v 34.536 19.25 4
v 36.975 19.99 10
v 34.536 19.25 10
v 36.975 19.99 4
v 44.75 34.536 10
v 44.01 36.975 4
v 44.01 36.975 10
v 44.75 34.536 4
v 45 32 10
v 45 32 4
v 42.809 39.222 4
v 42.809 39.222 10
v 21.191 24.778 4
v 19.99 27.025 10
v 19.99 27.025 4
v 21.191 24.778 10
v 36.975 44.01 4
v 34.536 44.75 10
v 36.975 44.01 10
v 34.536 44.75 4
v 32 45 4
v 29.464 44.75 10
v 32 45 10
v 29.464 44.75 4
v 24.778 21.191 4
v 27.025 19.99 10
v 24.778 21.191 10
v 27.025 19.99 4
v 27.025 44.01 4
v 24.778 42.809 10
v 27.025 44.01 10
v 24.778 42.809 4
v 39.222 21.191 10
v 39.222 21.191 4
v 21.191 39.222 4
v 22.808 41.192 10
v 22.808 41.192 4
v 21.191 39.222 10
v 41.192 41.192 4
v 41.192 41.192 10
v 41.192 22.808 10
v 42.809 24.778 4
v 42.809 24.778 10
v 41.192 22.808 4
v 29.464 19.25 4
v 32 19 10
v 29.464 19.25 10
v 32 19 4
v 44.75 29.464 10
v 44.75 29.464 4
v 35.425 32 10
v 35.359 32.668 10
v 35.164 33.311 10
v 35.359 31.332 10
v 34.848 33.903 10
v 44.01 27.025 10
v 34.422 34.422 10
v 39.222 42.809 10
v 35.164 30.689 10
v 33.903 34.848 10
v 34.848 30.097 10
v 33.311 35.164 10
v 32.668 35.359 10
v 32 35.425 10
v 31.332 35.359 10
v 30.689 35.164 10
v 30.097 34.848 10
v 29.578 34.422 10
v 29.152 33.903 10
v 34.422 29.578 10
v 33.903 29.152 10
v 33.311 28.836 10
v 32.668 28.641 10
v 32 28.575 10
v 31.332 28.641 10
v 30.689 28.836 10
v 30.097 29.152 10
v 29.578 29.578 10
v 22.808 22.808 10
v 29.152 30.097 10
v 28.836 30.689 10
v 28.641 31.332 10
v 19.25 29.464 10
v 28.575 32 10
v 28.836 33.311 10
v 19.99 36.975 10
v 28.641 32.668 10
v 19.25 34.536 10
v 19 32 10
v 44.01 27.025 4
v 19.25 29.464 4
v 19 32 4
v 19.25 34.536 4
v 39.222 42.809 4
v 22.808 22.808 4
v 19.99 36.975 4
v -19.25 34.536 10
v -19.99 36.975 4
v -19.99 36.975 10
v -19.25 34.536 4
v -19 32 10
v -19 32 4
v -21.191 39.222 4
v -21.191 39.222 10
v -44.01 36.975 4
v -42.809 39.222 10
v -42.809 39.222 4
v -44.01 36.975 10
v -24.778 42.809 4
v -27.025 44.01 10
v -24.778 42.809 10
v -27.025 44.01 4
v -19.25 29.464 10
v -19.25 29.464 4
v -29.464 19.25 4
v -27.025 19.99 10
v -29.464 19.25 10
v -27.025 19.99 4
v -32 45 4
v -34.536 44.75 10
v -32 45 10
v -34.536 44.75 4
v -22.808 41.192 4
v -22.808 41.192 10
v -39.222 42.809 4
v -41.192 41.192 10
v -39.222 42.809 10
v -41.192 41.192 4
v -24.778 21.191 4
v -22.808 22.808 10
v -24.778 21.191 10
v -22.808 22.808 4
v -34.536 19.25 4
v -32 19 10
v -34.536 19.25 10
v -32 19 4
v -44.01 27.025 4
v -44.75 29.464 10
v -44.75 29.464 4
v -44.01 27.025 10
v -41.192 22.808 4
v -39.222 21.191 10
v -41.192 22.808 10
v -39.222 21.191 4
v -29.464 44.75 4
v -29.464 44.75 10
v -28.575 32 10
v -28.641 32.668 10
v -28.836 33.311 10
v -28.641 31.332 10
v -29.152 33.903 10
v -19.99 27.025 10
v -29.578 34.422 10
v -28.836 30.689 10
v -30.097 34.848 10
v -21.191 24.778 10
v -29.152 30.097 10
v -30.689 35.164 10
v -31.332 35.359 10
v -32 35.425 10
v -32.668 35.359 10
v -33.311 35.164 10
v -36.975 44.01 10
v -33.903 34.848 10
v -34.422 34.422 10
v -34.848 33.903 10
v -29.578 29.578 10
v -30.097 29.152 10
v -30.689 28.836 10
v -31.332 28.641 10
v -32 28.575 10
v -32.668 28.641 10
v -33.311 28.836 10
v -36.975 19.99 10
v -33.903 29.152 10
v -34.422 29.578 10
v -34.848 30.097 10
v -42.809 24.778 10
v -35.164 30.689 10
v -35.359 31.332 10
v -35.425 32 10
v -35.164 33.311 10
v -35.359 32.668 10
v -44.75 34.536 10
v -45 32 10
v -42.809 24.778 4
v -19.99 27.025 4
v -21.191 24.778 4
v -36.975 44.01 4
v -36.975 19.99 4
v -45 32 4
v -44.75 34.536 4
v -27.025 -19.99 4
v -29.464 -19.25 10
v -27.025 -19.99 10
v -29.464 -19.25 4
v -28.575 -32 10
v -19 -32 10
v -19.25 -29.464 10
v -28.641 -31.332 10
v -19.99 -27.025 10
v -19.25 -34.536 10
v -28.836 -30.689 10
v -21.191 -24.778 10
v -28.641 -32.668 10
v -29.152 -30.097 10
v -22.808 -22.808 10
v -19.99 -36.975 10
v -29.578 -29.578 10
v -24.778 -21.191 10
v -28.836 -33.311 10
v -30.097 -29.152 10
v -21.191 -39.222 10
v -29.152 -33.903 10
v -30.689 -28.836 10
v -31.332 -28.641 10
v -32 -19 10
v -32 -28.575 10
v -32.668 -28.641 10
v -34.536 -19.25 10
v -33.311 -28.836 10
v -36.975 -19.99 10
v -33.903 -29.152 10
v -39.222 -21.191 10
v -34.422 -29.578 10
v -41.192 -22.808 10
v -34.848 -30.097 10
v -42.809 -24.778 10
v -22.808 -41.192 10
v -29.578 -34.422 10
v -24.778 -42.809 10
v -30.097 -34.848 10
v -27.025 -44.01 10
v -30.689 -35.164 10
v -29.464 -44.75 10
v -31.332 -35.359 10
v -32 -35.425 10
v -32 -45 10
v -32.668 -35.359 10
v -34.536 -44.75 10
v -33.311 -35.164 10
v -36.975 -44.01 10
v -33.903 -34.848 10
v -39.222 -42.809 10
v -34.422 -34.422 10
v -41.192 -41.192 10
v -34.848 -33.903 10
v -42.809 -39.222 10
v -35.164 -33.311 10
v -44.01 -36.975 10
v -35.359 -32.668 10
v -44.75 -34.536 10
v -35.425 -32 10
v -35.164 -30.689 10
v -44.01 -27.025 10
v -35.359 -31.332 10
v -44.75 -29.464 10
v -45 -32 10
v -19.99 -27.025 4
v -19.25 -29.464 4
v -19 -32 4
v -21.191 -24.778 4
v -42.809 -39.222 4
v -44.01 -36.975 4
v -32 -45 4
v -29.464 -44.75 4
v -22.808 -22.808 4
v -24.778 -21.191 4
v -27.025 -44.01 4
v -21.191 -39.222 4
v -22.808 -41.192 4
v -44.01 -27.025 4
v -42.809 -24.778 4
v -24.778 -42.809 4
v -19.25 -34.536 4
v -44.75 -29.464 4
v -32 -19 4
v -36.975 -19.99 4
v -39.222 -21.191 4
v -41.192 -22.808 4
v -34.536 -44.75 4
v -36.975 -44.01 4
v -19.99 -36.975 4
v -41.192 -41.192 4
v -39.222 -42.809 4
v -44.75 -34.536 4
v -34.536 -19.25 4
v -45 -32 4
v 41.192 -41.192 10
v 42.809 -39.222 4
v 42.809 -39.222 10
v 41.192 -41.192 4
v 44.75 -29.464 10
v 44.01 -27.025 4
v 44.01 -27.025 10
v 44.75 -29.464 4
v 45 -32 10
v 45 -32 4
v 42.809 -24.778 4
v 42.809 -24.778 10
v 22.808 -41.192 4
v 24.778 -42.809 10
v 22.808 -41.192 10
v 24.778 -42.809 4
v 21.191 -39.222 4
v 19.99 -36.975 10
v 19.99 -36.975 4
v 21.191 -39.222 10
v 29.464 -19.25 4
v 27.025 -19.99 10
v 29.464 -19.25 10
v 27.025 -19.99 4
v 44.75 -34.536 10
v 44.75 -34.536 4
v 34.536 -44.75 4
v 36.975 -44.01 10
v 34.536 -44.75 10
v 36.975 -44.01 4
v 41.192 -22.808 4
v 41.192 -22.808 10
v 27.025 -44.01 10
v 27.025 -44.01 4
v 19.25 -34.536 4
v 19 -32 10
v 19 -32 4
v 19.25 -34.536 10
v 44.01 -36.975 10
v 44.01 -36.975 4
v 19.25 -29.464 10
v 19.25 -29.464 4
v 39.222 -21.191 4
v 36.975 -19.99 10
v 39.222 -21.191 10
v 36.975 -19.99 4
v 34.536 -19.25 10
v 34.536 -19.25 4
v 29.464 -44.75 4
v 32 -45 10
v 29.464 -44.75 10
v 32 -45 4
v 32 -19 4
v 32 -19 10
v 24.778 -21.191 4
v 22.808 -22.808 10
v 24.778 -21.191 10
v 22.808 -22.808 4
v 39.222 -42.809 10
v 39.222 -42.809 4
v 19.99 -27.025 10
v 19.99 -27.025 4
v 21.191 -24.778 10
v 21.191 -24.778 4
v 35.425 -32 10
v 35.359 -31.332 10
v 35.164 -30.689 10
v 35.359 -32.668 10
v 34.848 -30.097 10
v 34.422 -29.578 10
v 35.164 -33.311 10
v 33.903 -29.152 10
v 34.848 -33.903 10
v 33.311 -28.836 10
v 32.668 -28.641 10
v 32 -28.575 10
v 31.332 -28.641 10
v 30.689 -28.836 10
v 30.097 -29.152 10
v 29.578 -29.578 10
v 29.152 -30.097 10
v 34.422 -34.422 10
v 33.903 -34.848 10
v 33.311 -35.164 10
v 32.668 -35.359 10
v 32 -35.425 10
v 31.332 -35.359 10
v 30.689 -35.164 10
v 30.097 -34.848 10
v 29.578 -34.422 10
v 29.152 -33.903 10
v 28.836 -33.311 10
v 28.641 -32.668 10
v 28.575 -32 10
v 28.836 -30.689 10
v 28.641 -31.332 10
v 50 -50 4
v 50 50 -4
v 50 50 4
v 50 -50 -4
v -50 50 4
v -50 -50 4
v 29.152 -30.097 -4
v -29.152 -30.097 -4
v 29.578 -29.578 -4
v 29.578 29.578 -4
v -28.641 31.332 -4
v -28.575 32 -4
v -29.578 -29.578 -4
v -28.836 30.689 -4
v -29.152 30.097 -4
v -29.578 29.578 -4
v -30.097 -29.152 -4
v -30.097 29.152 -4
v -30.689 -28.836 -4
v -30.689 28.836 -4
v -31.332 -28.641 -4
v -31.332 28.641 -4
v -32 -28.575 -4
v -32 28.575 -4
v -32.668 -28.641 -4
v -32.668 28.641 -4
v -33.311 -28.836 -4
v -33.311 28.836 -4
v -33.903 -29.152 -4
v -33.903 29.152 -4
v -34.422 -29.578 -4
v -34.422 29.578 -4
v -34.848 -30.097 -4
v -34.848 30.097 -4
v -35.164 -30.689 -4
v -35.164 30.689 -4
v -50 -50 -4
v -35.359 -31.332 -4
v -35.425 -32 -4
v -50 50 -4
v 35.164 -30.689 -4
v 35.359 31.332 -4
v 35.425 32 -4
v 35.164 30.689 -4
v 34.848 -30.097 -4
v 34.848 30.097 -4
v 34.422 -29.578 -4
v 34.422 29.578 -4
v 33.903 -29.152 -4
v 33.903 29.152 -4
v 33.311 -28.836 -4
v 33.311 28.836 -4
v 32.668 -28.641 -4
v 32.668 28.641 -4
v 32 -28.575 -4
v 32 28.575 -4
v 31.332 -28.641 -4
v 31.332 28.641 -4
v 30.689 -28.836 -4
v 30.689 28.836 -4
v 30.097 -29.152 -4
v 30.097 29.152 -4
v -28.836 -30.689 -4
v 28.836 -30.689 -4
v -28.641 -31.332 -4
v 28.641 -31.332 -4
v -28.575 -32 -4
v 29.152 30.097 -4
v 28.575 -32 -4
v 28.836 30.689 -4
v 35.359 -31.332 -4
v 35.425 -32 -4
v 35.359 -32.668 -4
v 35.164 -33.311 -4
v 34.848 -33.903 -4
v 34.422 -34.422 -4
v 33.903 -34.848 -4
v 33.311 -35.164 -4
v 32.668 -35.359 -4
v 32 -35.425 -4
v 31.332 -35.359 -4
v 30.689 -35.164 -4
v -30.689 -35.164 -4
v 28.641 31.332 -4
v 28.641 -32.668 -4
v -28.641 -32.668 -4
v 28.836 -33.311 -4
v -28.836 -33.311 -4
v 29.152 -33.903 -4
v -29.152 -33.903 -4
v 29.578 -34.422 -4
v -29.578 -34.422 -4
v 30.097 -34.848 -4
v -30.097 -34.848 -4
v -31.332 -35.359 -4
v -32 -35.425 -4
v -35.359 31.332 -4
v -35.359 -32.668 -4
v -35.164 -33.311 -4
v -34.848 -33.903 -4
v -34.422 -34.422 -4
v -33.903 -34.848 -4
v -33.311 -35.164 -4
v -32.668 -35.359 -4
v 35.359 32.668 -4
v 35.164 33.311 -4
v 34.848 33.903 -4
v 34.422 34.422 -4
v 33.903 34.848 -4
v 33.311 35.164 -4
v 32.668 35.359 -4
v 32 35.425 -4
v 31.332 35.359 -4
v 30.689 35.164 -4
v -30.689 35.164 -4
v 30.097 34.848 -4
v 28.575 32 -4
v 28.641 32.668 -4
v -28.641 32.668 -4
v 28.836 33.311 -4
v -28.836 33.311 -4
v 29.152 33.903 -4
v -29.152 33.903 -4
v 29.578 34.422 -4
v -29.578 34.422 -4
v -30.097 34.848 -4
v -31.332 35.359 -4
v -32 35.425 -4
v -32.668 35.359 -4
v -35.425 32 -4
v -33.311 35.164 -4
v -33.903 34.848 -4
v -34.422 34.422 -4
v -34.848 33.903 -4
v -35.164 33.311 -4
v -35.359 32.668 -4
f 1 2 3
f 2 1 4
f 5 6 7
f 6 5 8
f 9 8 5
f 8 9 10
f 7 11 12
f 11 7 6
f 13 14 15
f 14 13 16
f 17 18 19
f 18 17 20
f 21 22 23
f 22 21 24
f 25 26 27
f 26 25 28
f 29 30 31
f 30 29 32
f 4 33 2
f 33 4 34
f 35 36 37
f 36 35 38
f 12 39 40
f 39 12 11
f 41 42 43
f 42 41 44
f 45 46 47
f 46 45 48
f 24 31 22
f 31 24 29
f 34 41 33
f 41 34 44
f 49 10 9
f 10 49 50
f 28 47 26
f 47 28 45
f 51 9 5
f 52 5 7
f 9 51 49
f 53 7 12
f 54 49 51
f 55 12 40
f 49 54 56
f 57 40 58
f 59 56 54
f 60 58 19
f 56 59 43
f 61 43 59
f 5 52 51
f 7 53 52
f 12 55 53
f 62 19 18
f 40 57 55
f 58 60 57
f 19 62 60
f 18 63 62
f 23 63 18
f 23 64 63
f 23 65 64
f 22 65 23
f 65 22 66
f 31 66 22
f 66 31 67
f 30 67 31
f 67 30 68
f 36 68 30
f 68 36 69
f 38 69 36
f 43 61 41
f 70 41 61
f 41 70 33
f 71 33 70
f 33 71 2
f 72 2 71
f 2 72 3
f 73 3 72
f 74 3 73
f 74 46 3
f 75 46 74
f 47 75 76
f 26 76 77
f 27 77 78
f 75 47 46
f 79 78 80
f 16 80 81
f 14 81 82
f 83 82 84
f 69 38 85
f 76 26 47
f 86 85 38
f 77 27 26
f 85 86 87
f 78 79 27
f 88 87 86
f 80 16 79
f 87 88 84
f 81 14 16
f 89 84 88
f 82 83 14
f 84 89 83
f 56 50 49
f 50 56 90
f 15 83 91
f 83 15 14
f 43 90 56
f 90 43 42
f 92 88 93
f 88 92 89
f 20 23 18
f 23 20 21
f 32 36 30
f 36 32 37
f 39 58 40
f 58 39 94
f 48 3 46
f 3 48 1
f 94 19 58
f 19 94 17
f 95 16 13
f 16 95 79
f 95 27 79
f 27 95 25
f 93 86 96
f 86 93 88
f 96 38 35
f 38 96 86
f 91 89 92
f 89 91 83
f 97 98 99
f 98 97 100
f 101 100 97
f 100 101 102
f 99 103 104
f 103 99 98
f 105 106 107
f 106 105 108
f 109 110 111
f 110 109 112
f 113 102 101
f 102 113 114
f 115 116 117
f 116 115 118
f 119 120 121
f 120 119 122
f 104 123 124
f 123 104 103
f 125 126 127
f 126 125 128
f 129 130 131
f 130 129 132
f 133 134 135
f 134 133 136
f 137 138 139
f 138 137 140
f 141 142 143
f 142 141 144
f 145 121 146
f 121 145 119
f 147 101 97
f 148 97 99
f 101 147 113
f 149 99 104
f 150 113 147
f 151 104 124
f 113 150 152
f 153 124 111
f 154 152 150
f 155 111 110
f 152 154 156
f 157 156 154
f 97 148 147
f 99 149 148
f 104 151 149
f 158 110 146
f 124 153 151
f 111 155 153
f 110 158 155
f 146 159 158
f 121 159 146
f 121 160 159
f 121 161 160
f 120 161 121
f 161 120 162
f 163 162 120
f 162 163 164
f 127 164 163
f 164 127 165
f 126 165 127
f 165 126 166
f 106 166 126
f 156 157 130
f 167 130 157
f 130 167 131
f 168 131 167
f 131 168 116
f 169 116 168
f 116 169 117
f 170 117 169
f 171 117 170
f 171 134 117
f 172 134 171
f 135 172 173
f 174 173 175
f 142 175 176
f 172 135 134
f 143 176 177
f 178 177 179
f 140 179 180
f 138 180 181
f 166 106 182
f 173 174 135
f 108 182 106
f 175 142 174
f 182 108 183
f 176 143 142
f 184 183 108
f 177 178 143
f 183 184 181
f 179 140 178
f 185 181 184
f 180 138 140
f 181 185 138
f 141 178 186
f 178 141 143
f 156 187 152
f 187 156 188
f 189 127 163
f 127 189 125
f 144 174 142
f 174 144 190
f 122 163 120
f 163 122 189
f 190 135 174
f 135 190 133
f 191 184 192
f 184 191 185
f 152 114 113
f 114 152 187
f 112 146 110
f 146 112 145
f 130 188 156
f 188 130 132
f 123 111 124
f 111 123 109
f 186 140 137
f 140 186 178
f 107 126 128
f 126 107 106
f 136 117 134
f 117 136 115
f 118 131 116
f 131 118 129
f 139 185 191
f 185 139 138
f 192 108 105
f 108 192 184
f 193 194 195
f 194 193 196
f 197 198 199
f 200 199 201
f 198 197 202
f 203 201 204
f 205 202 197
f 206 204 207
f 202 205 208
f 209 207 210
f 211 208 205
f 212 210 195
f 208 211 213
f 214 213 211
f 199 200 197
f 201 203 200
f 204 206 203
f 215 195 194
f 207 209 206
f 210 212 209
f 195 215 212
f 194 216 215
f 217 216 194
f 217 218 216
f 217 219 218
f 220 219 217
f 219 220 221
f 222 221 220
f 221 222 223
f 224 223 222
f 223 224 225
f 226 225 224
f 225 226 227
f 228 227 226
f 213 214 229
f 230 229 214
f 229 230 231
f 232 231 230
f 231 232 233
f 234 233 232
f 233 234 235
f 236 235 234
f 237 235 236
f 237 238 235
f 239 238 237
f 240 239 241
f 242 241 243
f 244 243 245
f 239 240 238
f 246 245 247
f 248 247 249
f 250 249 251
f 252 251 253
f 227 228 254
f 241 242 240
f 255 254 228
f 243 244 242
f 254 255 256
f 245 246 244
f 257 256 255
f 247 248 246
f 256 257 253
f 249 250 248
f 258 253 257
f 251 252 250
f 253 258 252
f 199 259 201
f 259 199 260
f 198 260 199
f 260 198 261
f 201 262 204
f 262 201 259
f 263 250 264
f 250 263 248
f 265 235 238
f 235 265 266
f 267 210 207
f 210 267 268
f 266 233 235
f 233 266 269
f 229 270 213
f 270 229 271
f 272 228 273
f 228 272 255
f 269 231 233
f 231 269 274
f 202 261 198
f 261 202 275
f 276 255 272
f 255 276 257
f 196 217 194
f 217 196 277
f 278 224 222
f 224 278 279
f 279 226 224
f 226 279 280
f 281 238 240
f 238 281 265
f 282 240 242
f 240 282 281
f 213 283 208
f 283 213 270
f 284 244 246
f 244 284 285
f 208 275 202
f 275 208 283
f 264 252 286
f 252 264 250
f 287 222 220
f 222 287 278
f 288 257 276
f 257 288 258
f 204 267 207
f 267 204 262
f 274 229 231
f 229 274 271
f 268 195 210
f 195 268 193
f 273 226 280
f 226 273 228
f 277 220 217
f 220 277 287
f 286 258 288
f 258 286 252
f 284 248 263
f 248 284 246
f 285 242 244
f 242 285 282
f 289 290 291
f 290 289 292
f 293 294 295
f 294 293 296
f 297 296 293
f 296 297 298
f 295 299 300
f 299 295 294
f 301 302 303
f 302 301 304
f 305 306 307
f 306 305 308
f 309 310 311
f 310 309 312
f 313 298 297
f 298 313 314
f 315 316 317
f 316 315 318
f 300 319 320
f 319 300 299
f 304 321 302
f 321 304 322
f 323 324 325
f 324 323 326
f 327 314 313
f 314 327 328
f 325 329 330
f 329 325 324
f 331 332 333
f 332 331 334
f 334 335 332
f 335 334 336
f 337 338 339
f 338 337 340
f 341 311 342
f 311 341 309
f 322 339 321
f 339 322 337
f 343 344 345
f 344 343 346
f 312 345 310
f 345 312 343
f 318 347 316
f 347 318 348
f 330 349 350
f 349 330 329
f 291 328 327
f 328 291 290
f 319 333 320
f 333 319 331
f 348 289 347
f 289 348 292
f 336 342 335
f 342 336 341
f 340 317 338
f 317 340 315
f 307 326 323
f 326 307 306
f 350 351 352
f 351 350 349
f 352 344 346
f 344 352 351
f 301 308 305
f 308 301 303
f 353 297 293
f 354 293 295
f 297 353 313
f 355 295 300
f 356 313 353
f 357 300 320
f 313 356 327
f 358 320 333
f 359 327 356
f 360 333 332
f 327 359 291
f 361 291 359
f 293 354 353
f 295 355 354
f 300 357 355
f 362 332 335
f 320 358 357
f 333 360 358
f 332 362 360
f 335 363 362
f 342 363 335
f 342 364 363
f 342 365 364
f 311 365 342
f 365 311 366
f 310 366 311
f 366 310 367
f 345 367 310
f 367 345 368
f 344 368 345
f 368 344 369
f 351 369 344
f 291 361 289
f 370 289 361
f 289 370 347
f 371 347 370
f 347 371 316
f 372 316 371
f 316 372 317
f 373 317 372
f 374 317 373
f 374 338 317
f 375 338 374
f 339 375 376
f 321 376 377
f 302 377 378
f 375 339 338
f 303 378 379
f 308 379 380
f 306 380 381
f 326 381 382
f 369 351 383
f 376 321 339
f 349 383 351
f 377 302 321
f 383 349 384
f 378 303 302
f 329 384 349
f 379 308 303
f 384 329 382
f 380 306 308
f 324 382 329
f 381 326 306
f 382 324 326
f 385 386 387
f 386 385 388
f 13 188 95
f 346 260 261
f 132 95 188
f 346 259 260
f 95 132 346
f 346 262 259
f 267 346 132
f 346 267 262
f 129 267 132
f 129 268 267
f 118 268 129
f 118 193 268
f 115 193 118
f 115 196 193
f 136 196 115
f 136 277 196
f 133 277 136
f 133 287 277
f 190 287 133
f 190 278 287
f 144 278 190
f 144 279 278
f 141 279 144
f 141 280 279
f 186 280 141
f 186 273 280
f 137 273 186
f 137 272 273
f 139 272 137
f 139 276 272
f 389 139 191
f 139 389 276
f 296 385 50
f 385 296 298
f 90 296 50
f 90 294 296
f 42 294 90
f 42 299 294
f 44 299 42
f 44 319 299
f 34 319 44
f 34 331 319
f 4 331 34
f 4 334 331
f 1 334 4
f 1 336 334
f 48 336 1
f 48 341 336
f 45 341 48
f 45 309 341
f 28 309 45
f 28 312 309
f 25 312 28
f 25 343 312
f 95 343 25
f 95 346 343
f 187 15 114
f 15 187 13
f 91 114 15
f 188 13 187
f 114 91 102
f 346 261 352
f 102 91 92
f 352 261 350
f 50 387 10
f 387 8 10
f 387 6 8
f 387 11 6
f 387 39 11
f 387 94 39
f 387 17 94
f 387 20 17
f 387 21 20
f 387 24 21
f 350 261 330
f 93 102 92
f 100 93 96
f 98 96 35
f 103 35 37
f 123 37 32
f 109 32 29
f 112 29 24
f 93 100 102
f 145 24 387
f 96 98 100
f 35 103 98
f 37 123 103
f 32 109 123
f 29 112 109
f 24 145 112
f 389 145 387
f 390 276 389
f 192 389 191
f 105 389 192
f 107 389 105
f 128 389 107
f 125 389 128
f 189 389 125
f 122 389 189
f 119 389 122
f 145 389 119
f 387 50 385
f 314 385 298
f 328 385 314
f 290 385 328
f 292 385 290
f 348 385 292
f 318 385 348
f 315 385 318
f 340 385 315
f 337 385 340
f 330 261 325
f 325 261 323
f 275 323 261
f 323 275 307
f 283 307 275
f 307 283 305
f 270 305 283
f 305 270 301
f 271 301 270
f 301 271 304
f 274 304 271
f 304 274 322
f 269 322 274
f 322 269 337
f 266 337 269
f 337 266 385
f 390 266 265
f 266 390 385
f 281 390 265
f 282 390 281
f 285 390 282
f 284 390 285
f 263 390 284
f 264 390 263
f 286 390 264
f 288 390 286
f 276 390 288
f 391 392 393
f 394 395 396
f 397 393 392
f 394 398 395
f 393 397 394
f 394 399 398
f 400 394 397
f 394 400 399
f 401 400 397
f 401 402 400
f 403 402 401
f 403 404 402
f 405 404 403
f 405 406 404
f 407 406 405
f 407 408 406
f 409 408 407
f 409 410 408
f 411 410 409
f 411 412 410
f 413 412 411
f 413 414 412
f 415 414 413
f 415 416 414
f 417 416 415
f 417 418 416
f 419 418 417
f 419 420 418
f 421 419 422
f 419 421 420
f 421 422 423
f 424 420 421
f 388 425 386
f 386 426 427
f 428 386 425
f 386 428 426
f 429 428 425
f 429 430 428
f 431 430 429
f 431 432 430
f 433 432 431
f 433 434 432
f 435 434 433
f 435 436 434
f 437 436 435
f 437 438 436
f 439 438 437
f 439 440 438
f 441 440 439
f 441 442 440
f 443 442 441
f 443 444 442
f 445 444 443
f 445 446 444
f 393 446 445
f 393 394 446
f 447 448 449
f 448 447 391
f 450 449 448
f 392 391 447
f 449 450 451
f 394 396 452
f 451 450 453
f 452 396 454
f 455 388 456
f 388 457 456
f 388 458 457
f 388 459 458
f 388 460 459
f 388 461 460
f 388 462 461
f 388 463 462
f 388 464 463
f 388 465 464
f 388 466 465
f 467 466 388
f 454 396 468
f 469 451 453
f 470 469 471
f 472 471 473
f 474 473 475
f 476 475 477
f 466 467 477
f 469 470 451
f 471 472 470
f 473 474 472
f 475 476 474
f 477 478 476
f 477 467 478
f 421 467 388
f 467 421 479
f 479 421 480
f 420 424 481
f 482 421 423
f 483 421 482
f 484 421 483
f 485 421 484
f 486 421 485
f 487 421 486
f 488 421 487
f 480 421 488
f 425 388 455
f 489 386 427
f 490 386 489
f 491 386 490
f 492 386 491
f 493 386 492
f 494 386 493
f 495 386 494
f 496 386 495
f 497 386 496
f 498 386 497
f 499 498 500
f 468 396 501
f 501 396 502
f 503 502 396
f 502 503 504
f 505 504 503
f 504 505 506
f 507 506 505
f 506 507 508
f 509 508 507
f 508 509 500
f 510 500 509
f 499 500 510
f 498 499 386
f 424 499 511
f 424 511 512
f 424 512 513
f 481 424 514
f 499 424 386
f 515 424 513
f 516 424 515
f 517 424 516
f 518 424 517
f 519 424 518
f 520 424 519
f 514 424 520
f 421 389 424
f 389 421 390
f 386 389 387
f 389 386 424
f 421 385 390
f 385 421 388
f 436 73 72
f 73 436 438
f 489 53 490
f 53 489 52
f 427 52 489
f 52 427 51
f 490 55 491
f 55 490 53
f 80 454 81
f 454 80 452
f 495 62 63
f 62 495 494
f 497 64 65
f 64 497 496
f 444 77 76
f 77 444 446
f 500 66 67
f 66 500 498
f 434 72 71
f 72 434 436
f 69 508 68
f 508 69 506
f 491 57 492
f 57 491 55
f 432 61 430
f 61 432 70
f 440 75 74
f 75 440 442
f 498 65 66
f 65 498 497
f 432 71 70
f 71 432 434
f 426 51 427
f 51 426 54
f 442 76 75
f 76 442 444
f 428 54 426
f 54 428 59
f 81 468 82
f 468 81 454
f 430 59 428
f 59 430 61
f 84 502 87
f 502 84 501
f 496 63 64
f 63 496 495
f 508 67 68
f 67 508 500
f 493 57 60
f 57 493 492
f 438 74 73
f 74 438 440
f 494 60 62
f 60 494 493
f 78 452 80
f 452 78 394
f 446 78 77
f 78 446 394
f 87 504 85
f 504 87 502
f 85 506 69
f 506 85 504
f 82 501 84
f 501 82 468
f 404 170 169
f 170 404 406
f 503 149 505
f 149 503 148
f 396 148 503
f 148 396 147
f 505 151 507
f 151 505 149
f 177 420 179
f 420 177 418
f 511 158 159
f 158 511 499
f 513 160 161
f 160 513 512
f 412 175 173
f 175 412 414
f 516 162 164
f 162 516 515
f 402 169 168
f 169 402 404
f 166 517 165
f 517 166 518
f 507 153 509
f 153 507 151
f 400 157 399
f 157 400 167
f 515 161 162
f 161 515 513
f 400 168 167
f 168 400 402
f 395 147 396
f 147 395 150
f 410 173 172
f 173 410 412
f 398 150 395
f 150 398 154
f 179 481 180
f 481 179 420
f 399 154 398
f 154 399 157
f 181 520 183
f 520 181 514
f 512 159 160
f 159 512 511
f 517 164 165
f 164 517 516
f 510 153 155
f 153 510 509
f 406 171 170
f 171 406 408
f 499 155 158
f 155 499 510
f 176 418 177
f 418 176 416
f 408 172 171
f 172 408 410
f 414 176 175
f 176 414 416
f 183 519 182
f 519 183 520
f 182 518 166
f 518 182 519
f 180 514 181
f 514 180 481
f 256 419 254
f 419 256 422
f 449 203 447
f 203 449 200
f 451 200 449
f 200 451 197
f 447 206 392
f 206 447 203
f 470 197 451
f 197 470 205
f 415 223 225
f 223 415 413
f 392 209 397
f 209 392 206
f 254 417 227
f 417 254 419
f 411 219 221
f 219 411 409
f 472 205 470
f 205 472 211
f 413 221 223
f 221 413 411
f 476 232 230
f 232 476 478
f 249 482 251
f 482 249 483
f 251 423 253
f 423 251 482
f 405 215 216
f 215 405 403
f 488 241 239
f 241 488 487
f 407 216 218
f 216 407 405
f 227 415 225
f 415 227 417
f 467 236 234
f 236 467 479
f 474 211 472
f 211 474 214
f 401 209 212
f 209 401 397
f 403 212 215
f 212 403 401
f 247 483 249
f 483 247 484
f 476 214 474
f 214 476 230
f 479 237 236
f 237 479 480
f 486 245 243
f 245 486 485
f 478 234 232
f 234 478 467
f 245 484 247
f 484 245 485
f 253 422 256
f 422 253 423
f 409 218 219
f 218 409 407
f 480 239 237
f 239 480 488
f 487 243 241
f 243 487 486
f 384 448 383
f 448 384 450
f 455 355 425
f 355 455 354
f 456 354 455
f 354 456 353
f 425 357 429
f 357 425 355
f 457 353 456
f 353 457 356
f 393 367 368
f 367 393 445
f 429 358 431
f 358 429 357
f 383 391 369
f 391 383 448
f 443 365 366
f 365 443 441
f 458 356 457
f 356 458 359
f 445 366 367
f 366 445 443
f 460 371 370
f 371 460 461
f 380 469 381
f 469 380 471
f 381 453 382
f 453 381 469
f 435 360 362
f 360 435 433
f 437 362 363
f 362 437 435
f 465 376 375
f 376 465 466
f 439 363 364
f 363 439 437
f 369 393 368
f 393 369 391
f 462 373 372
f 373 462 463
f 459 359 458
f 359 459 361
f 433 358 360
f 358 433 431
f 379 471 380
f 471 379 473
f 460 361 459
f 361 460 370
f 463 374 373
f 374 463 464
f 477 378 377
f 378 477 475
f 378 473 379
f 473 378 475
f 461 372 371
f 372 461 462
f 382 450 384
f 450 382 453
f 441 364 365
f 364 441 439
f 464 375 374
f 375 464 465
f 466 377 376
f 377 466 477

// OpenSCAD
$fn = 32;

// ----------------------------------------------------------------------
// Anchor pads 100 x 100 x 14
// four corner bosses with anchor holes
// ----------------------------------------------------------------------

// --- parameters (mm) ---
plate = [100, 100, 8];   // base plate size (x, y, z)
pads = 4;                // boss count, one per corner
edge = 18;               // boss centre offset from the plate edge
boss_d = 26;             // boss diameter
boss_h = 6;              // boss height above the base plate
bore_d = 6.6;            // nominal hole diameter from the drawing
print_allowance = 0.25;  // clearance added for printing

// --- derived feature positions (mm) ---
hole_d = bore_d + print_allowance;  // = 6.85   hole diameter as printed
height = plate[2] + boss_h;         // = 14   overall height of the part
corner_x = plate[0] / 2 - edge;     // = 32   boss centre X
corner_y = plate[1] / 2 - edge;     // = 32   boss centre Y
feature_centers = [
  [corner_x, corner_y],
  [-corner_x, corner_y],
  [-corner_x, -corner_y],
  [corner_x, -corner_y]
];   // boss centres, anchor holes are drilled there

// base plate, four bosses standing on it, anchor holes all the way through
difference() {
  union() {
    cube(plate, center = true);
    for (centre = feature_centers)
      translate([centre[0], centre[1], plate[2] / 2 - 1])
        cylinder(d = boss_d, h = boss_h + 1);
  }
  for (centre = feature_centers)
    translate([centre[0], centre[1], -height])
      cylinder(d = hole_d, h = 2 * height + 2);  // through boss and plate
}
